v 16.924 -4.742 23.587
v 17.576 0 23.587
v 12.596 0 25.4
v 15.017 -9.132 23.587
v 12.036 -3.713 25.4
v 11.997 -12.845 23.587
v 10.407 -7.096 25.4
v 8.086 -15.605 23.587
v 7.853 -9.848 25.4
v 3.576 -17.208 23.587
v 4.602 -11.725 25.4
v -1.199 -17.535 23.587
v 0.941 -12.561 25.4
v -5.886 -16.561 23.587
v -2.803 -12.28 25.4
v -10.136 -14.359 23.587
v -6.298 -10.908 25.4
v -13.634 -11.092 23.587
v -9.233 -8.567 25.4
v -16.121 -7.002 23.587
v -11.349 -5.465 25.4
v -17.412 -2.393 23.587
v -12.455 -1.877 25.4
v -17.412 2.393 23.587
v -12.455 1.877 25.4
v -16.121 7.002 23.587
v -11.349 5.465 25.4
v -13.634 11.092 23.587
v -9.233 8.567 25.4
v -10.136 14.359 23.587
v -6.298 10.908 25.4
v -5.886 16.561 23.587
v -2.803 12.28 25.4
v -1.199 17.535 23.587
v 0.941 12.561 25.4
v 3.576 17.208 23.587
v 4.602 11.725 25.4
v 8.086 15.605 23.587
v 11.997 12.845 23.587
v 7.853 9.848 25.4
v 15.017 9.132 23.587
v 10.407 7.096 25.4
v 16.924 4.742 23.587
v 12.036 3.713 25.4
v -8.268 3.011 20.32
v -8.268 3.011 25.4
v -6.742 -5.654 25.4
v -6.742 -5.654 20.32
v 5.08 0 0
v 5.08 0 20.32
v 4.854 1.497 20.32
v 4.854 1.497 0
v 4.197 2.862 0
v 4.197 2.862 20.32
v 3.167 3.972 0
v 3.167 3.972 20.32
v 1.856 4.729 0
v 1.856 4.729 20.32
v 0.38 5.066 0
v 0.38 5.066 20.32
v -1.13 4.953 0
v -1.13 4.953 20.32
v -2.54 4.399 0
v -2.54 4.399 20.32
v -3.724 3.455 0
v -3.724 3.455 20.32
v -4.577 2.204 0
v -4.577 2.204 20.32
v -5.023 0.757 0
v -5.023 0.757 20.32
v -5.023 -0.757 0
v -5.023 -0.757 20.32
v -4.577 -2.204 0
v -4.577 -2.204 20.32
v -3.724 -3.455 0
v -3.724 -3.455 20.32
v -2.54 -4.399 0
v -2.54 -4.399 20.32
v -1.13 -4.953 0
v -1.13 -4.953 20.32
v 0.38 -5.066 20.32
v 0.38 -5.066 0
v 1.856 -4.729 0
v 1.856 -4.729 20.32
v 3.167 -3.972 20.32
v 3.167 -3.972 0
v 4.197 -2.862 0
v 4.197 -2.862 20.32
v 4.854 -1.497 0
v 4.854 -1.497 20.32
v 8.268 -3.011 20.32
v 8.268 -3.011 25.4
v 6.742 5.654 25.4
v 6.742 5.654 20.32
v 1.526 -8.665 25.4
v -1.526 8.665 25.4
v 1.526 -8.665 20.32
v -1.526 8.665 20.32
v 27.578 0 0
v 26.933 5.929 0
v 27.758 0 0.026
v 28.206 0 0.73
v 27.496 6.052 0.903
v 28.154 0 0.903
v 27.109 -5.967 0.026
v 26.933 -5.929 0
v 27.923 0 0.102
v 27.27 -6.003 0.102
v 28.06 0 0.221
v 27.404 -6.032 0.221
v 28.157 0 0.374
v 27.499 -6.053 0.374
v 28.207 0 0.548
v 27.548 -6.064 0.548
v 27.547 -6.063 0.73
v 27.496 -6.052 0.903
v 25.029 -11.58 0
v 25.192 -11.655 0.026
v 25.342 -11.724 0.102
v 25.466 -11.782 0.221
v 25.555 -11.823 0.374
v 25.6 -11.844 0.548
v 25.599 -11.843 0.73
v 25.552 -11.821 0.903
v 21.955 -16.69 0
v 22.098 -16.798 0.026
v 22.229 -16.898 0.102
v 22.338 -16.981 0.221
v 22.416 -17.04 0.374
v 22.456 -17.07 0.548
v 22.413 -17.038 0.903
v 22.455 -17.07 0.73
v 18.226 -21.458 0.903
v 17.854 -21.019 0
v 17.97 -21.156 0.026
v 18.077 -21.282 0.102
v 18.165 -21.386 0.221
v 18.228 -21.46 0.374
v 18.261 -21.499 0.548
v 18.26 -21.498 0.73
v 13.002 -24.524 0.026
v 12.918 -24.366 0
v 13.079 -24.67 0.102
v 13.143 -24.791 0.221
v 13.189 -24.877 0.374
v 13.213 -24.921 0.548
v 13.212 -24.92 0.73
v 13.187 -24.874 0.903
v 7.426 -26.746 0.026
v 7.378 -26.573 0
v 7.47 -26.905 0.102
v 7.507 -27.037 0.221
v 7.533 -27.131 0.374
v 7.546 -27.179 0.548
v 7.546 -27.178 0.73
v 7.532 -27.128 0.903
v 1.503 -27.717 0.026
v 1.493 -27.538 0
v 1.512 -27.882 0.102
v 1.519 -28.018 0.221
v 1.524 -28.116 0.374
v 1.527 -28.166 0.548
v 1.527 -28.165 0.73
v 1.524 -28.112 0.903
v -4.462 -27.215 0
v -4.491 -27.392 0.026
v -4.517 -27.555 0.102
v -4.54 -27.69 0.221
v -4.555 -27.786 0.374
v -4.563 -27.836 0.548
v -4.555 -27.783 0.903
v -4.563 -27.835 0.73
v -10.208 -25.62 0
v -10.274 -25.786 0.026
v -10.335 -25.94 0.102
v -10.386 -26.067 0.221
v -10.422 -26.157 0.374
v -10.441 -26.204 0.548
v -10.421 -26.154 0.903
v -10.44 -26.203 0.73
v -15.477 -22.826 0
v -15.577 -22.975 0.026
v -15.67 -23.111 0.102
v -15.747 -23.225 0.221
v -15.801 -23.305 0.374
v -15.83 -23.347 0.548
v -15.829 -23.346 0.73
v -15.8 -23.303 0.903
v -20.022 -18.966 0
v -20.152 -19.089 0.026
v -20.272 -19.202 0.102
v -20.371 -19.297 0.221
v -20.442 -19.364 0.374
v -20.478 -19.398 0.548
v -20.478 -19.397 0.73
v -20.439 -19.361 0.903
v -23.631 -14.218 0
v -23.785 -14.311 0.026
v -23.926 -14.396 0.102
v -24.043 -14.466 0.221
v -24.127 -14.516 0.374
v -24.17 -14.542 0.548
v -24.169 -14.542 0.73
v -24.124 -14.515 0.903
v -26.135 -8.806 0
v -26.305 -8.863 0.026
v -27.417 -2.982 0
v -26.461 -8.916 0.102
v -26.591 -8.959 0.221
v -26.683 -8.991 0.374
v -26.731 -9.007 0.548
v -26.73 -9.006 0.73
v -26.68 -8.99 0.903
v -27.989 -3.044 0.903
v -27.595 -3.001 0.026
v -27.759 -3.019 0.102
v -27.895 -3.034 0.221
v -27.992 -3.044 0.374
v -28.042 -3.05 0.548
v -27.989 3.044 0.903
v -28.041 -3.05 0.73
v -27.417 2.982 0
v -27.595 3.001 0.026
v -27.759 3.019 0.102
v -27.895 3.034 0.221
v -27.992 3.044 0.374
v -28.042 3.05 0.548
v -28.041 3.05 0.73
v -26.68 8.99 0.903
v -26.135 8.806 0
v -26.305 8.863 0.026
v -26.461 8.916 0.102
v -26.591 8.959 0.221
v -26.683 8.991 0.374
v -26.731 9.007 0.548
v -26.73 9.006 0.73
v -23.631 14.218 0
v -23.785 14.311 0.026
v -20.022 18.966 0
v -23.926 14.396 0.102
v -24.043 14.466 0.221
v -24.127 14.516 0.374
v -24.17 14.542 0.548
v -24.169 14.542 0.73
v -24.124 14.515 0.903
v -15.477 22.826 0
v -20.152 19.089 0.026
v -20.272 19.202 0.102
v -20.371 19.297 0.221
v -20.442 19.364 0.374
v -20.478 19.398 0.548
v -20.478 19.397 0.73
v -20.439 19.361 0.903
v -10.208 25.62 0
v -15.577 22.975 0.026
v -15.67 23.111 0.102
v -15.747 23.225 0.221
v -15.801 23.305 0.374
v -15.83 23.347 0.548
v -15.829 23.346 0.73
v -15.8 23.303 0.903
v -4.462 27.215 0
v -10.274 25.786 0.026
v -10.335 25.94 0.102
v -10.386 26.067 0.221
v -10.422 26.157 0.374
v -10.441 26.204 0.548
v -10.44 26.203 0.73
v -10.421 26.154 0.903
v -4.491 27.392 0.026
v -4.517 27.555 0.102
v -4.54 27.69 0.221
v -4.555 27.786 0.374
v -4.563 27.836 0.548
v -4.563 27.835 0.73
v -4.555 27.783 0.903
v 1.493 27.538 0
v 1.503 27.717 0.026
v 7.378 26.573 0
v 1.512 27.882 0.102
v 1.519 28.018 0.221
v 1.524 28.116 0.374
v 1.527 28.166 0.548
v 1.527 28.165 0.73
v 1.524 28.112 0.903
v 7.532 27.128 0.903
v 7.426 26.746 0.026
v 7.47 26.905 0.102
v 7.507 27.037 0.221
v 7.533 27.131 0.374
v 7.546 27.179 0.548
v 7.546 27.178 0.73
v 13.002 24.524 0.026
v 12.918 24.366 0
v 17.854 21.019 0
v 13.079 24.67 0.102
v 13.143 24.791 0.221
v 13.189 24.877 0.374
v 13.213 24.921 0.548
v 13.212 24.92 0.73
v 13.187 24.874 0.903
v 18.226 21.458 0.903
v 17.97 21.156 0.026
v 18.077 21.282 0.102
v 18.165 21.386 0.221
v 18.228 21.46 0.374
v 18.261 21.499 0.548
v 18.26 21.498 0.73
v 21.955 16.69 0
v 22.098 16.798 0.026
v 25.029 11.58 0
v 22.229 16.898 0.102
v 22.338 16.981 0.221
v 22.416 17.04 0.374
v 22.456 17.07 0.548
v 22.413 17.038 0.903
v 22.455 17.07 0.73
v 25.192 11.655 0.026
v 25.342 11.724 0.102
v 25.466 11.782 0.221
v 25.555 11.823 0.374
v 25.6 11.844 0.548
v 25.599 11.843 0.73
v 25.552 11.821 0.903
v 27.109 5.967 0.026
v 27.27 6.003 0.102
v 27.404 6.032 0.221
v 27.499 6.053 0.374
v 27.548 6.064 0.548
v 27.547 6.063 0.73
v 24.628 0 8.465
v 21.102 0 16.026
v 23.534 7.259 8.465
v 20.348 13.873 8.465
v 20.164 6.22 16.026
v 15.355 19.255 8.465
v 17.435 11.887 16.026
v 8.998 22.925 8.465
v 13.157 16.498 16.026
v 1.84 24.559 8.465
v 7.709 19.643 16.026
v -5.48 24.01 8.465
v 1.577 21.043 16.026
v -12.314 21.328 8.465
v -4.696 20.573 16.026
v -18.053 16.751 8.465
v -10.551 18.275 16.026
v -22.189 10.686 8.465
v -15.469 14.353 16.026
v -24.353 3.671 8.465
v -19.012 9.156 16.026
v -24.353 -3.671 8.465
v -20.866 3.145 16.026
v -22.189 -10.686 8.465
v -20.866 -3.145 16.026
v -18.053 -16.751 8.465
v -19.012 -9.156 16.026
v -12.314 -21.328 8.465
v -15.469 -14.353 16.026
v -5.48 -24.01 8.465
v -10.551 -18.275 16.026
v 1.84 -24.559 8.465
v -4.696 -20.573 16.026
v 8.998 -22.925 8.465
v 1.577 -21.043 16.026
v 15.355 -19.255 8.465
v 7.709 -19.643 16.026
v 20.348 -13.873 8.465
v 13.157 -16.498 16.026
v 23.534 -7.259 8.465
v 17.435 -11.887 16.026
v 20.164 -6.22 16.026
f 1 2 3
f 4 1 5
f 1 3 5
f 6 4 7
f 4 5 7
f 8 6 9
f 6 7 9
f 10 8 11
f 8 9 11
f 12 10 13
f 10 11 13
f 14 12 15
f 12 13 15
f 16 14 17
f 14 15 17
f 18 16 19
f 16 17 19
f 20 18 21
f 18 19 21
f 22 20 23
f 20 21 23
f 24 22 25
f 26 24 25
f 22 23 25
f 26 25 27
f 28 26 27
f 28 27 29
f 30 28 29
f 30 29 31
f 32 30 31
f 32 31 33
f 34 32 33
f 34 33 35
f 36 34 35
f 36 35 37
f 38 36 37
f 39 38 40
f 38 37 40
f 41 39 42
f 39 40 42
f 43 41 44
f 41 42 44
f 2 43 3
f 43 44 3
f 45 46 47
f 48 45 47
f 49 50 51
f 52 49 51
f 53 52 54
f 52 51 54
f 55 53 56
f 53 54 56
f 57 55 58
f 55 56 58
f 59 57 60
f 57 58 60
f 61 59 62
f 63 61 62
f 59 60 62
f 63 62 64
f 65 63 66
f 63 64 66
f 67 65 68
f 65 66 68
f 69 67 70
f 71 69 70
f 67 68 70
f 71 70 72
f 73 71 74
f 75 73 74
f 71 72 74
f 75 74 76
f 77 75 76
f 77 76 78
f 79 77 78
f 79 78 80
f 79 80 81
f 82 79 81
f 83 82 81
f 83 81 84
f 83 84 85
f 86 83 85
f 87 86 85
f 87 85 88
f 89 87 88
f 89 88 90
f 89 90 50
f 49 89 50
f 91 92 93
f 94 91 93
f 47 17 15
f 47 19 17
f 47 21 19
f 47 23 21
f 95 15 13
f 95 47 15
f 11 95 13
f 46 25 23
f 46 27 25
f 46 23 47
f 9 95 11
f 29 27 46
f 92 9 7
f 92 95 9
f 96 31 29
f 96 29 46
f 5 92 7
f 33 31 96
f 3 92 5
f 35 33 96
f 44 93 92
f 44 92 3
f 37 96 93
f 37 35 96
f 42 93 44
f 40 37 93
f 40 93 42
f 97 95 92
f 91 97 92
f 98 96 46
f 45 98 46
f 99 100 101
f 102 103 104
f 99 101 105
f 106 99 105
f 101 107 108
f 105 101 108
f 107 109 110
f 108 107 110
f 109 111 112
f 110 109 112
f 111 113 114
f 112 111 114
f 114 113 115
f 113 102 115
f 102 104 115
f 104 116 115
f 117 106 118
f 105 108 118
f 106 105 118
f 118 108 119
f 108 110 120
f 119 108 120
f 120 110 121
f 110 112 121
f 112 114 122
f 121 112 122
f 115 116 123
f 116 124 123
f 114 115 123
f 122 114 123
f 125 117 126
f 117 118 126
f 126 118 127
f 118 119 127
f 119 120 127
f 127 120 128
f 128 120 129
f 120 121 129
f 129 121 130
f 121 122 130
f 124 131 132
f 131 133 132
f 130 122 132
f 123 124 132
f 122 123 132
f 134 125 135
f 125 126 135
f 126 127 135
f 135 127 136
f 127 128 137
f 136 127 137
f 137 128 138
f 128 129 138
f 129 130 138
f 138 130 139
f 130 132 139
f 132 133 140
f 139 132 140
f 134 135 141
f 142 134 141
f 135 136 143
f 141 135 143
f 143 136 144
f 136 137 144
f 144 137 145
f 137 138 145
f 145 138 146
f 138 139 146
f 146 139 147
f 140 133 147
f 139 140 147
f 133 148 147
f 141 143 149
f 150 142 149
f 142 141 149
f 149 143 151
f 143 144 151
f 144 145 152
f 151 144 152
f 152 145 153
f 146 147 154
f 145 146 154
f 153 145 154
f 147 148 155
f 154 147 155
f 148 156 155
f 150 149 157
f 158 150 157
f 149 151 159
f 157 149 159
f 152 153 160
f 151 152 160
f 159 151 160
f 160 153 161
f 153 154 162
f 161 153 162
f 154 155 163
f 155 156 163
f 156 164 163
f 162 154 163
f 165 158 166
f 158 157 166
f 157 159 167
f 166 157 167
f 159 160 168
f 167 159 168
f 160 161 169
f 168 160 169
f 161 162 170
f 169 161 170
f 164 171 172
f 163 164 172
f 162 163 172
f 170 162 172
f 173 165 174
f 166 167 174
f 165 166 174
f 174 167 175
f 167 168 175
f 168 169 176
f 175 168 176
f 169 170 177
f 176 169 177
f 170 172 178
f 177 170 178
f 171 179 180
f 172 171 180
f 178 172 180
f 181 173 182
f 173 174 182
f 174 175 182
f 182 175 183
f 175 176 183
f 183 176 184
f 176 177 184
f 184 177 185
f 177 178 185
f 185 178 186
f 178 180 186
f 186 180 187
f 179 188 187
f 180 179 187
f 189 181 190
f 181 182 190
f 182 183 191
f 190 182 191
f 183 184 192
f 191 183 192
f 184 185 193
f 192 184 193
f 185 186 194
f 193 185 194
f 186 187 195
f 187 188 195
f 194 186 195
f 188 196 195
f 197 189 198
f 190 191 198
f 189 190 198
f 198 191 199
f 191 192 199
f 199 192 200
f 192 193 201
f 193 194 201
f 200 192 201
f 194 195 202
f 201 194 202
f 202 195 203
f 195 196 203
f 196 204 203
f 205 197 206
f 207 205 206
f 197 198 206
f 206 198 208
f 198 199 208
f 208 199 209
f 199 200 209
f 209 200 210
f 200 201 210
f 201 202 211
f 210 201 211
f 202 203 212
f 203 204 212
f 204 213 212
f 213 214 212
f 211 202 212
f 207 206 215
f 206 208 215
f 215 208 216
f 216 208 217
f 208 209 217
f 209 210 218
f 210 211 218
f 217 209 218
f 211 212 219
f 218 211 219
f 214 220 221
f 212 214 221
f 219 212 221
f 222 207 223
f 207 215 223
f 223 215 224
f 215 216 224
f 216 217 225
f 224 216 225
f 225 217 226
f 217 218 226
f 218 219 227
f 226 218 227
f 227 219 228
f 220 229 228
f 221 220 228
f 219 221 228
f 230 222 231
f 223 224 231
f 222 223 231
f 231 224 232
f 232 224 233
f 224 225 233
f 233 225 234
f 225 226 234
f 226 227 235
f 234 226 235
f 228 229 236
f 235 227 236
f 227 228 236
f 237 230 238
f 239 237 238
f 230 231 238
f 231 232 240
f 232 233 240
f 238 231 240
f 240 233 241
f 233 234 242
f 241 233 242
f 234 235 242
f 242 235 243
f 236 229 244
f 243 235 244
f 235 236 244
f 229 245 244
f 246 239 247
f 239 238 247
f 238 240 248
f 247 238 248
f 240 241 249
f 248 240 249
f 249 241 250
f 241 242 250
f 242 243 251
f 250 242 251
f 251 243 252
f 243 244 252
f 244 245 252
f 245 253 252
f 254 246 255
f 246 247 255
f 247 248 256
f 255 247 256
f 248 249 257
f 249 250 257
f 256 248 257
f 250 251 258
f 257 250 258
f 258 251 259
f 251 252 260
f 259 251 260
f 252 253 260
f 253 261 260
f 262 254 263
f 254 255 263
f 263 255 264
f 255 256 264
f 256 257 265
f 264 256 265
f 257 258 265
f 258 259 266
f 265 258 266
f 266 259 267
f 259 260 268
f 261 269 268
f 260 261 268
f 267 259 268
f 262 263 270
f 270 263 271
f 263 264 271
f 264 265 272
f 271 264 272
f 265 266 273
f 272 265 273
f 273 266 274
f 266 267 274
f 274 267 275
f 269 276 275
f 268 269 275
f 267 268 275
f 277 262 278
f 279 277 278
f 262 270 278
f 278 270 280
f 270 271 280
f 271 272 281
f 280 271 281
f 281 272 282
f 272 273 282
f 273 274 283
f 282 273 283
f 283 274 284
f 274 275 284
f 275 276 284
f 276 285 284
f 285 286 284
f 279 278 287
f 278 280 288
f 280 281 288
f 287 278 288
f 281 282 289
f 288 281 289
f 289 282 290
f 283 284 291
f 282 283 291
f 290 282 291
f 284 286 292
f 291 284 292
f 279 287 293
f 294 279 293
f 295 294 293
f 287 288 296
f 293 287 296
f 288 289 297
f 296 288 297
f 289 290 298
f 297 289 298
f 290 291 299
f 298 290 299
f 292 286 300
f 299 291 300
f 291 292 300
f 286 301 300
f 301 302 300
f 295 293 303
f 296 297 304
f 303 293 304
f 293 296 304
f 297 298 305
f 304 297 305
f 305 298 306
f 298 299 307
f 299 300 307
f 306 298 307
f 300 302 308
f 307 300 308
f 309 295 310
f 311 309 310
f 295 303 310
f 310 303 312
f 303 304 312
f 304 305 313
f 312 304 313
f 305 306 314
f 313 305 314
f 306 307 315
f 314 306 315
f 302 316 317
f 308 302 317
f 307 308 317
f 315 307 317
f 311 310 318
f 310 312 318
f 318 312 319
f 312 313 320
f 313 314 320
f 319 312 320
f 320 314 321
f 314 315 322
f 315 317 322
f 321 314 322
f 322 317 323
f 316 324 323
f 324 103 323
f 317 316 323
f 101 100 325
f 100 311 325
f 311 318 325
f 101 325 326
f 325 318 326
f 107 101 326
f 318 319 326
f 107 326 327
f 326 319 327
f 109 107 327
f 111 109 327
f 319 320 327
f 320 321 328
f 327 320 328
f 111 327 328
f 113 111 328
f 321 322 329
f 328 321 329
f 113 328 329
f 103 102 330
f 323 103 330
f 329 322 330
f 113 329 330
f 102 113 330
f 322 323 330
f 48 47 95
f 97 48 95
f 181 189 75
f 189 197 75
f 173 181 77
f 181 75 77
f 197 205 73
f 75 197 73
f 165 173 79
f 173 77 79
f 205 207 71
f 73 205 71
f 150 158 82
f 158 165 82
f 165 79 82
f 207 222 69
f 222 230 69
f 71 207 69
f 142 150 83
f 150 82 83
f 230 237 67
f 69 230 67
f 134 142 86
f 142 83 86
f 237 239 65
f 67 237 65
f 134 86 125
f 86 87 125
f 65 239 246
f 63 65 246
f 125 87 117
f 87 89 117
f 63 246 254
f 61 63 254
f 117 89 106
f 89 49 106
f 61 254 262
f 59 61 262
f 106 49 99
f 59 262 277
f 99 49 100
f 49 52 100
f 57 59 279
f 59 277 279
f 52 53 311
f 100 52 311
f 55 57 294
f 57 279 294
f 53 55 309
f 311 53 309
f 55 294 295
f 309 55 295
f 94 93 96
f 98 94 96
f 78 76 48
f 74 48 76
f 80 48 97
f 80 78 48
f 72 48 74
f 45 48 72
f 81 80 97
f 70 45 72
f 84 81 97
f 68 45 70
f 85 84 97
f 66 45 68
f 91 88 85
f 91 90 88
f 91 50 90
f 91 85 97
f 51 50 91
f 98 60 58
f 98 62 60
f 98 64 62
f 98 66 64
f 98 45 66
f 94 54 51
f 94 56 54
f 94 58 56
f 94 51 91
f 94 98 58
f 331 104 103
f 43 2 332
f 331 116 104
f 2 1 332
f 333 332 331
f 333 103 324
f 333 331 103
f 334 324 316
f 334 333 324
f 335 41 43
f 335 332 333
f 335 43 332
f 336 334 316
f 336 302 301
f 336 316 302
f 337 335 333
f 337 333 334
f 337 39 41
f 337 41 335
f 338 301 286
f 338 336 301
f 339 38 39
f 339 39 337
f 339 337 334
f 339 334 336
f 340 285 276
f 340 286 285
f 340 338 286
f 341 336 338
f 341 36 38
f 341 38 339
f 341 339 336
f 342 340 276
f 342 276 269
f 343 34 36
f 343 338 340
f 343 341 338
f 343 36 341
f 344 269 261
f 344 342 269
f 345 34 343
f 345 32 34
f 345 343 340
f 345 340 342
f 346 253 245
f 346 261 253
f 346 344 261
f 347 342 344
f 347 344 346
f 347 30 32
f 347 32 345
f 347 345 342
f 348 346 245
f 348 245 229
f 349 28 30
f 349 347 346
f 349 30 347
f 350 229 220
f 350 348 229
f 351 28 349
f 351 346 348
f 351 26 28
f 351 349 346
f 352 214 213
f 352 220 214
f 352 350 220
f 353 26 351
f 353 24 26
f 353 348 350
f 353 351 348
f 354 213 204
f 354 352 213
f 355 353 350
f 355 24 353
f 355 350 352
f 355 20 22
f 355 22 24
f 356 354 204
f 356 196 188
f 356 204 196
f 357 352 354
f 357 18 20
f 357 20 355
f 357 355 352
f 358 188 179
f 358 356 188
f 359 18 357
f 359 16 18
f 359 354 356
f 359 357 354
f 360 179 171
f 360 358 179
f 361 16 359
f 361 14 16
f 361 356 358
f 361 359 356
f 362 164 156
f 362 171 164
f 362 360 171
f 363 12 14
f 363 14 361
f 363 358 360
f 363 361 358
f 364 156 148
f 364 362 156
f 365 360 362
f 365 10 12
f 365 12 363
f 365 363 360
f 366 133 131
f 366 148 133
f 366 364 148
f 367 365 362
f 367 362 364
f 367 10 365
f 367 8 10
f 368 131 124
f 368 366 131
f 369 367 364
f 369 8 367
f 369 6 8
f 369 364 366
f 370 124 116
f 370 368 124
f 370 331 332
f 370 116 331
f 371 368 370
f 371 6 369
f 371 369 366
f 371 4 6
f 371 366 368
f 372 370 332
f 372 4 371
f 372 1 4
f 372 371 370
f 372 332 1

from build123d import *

# Parameters (mm, degrees)
SKETCH1_R          = 28.575
CONE_EXTRUDE_DEPTH = 25.4
CONE_EXTRUDE_TAPER = 25
CHAMFER1_SIZE      = 2
CHAMFER1_SIZE_2    = 4.134883836
NUT_HOLE_CUT_DEPTH = 5.08
SKETCH4_R          = 5.08
CUT_EXTRUDE2_DEPTH = 46.232329699
FILLET2_R          = 0.635


with BuildPart() as part:
    # Sketch1 → Cone Extrude (new body)
    with BuildSketch(Plane.XY):
        Circle(SKETCH1_R)
    extrude(amount=CONE_EXTRUDE_DEPTH, taper=CONE_EXTRUDE_TAPER)

    # Chamfer1
    # the kernel refuses this chamfer: 4.134883836, 2 mm, written as the material it takes off along each edge
    with BuildSketch(Plane(origin=(0, 0, 25.4), x_dir=(1, 0, 0), z_dir=(0, 1, 0))) as chamfer1_piece_1:
        Polygon((16.730785483 + CHAMFER1_SIZE * 0.422618261741, CHAMFER1_SIZE * 0.906307787037), (16.730785483 - CHAMFER1_SIZE_2, 0), (16.730785483, 0), align=None)
    revolve(axis=Axis((0, 0, 25.4), (0, 0, -1)), mode=Mode.SUBTRACT)

    # Sketch3 → Nut Hole Cut (cut)
    with BuildSketch(Plane.XY.offset(25.4)):
        Polygon((6.741570116, 5.654240212), (-1.525930605, 8.665491088), (-8.267500721, 3.011250876), (-6.741570116, -5.654240212), (1.525930605, -8.665491088), (8.267500721, -3.011250876), align=None)
    extrude(amount=-NUT_HOLE_CUT_DEPTH, mode=Mode.SUBTRACT)

    # Sketch4 → Cut-Extrude2 (cut, through all)
    with BuildSketch(Plane.XY.offset(20.32)):
        Circle(SKETCH4_R)
    extrude(amount=-CUT_EXTRUDE2_DEPTH, mode=Mode.SUBTRACT)

    # Fillet2
    fillet2_edges = [part.edges().sort_by_distance(p)[0] for p in [
        (-28.575, 0, 0),
    ]]
    fillet(fillet2_edges, radius=FILLET2_R)


solid = part.part
